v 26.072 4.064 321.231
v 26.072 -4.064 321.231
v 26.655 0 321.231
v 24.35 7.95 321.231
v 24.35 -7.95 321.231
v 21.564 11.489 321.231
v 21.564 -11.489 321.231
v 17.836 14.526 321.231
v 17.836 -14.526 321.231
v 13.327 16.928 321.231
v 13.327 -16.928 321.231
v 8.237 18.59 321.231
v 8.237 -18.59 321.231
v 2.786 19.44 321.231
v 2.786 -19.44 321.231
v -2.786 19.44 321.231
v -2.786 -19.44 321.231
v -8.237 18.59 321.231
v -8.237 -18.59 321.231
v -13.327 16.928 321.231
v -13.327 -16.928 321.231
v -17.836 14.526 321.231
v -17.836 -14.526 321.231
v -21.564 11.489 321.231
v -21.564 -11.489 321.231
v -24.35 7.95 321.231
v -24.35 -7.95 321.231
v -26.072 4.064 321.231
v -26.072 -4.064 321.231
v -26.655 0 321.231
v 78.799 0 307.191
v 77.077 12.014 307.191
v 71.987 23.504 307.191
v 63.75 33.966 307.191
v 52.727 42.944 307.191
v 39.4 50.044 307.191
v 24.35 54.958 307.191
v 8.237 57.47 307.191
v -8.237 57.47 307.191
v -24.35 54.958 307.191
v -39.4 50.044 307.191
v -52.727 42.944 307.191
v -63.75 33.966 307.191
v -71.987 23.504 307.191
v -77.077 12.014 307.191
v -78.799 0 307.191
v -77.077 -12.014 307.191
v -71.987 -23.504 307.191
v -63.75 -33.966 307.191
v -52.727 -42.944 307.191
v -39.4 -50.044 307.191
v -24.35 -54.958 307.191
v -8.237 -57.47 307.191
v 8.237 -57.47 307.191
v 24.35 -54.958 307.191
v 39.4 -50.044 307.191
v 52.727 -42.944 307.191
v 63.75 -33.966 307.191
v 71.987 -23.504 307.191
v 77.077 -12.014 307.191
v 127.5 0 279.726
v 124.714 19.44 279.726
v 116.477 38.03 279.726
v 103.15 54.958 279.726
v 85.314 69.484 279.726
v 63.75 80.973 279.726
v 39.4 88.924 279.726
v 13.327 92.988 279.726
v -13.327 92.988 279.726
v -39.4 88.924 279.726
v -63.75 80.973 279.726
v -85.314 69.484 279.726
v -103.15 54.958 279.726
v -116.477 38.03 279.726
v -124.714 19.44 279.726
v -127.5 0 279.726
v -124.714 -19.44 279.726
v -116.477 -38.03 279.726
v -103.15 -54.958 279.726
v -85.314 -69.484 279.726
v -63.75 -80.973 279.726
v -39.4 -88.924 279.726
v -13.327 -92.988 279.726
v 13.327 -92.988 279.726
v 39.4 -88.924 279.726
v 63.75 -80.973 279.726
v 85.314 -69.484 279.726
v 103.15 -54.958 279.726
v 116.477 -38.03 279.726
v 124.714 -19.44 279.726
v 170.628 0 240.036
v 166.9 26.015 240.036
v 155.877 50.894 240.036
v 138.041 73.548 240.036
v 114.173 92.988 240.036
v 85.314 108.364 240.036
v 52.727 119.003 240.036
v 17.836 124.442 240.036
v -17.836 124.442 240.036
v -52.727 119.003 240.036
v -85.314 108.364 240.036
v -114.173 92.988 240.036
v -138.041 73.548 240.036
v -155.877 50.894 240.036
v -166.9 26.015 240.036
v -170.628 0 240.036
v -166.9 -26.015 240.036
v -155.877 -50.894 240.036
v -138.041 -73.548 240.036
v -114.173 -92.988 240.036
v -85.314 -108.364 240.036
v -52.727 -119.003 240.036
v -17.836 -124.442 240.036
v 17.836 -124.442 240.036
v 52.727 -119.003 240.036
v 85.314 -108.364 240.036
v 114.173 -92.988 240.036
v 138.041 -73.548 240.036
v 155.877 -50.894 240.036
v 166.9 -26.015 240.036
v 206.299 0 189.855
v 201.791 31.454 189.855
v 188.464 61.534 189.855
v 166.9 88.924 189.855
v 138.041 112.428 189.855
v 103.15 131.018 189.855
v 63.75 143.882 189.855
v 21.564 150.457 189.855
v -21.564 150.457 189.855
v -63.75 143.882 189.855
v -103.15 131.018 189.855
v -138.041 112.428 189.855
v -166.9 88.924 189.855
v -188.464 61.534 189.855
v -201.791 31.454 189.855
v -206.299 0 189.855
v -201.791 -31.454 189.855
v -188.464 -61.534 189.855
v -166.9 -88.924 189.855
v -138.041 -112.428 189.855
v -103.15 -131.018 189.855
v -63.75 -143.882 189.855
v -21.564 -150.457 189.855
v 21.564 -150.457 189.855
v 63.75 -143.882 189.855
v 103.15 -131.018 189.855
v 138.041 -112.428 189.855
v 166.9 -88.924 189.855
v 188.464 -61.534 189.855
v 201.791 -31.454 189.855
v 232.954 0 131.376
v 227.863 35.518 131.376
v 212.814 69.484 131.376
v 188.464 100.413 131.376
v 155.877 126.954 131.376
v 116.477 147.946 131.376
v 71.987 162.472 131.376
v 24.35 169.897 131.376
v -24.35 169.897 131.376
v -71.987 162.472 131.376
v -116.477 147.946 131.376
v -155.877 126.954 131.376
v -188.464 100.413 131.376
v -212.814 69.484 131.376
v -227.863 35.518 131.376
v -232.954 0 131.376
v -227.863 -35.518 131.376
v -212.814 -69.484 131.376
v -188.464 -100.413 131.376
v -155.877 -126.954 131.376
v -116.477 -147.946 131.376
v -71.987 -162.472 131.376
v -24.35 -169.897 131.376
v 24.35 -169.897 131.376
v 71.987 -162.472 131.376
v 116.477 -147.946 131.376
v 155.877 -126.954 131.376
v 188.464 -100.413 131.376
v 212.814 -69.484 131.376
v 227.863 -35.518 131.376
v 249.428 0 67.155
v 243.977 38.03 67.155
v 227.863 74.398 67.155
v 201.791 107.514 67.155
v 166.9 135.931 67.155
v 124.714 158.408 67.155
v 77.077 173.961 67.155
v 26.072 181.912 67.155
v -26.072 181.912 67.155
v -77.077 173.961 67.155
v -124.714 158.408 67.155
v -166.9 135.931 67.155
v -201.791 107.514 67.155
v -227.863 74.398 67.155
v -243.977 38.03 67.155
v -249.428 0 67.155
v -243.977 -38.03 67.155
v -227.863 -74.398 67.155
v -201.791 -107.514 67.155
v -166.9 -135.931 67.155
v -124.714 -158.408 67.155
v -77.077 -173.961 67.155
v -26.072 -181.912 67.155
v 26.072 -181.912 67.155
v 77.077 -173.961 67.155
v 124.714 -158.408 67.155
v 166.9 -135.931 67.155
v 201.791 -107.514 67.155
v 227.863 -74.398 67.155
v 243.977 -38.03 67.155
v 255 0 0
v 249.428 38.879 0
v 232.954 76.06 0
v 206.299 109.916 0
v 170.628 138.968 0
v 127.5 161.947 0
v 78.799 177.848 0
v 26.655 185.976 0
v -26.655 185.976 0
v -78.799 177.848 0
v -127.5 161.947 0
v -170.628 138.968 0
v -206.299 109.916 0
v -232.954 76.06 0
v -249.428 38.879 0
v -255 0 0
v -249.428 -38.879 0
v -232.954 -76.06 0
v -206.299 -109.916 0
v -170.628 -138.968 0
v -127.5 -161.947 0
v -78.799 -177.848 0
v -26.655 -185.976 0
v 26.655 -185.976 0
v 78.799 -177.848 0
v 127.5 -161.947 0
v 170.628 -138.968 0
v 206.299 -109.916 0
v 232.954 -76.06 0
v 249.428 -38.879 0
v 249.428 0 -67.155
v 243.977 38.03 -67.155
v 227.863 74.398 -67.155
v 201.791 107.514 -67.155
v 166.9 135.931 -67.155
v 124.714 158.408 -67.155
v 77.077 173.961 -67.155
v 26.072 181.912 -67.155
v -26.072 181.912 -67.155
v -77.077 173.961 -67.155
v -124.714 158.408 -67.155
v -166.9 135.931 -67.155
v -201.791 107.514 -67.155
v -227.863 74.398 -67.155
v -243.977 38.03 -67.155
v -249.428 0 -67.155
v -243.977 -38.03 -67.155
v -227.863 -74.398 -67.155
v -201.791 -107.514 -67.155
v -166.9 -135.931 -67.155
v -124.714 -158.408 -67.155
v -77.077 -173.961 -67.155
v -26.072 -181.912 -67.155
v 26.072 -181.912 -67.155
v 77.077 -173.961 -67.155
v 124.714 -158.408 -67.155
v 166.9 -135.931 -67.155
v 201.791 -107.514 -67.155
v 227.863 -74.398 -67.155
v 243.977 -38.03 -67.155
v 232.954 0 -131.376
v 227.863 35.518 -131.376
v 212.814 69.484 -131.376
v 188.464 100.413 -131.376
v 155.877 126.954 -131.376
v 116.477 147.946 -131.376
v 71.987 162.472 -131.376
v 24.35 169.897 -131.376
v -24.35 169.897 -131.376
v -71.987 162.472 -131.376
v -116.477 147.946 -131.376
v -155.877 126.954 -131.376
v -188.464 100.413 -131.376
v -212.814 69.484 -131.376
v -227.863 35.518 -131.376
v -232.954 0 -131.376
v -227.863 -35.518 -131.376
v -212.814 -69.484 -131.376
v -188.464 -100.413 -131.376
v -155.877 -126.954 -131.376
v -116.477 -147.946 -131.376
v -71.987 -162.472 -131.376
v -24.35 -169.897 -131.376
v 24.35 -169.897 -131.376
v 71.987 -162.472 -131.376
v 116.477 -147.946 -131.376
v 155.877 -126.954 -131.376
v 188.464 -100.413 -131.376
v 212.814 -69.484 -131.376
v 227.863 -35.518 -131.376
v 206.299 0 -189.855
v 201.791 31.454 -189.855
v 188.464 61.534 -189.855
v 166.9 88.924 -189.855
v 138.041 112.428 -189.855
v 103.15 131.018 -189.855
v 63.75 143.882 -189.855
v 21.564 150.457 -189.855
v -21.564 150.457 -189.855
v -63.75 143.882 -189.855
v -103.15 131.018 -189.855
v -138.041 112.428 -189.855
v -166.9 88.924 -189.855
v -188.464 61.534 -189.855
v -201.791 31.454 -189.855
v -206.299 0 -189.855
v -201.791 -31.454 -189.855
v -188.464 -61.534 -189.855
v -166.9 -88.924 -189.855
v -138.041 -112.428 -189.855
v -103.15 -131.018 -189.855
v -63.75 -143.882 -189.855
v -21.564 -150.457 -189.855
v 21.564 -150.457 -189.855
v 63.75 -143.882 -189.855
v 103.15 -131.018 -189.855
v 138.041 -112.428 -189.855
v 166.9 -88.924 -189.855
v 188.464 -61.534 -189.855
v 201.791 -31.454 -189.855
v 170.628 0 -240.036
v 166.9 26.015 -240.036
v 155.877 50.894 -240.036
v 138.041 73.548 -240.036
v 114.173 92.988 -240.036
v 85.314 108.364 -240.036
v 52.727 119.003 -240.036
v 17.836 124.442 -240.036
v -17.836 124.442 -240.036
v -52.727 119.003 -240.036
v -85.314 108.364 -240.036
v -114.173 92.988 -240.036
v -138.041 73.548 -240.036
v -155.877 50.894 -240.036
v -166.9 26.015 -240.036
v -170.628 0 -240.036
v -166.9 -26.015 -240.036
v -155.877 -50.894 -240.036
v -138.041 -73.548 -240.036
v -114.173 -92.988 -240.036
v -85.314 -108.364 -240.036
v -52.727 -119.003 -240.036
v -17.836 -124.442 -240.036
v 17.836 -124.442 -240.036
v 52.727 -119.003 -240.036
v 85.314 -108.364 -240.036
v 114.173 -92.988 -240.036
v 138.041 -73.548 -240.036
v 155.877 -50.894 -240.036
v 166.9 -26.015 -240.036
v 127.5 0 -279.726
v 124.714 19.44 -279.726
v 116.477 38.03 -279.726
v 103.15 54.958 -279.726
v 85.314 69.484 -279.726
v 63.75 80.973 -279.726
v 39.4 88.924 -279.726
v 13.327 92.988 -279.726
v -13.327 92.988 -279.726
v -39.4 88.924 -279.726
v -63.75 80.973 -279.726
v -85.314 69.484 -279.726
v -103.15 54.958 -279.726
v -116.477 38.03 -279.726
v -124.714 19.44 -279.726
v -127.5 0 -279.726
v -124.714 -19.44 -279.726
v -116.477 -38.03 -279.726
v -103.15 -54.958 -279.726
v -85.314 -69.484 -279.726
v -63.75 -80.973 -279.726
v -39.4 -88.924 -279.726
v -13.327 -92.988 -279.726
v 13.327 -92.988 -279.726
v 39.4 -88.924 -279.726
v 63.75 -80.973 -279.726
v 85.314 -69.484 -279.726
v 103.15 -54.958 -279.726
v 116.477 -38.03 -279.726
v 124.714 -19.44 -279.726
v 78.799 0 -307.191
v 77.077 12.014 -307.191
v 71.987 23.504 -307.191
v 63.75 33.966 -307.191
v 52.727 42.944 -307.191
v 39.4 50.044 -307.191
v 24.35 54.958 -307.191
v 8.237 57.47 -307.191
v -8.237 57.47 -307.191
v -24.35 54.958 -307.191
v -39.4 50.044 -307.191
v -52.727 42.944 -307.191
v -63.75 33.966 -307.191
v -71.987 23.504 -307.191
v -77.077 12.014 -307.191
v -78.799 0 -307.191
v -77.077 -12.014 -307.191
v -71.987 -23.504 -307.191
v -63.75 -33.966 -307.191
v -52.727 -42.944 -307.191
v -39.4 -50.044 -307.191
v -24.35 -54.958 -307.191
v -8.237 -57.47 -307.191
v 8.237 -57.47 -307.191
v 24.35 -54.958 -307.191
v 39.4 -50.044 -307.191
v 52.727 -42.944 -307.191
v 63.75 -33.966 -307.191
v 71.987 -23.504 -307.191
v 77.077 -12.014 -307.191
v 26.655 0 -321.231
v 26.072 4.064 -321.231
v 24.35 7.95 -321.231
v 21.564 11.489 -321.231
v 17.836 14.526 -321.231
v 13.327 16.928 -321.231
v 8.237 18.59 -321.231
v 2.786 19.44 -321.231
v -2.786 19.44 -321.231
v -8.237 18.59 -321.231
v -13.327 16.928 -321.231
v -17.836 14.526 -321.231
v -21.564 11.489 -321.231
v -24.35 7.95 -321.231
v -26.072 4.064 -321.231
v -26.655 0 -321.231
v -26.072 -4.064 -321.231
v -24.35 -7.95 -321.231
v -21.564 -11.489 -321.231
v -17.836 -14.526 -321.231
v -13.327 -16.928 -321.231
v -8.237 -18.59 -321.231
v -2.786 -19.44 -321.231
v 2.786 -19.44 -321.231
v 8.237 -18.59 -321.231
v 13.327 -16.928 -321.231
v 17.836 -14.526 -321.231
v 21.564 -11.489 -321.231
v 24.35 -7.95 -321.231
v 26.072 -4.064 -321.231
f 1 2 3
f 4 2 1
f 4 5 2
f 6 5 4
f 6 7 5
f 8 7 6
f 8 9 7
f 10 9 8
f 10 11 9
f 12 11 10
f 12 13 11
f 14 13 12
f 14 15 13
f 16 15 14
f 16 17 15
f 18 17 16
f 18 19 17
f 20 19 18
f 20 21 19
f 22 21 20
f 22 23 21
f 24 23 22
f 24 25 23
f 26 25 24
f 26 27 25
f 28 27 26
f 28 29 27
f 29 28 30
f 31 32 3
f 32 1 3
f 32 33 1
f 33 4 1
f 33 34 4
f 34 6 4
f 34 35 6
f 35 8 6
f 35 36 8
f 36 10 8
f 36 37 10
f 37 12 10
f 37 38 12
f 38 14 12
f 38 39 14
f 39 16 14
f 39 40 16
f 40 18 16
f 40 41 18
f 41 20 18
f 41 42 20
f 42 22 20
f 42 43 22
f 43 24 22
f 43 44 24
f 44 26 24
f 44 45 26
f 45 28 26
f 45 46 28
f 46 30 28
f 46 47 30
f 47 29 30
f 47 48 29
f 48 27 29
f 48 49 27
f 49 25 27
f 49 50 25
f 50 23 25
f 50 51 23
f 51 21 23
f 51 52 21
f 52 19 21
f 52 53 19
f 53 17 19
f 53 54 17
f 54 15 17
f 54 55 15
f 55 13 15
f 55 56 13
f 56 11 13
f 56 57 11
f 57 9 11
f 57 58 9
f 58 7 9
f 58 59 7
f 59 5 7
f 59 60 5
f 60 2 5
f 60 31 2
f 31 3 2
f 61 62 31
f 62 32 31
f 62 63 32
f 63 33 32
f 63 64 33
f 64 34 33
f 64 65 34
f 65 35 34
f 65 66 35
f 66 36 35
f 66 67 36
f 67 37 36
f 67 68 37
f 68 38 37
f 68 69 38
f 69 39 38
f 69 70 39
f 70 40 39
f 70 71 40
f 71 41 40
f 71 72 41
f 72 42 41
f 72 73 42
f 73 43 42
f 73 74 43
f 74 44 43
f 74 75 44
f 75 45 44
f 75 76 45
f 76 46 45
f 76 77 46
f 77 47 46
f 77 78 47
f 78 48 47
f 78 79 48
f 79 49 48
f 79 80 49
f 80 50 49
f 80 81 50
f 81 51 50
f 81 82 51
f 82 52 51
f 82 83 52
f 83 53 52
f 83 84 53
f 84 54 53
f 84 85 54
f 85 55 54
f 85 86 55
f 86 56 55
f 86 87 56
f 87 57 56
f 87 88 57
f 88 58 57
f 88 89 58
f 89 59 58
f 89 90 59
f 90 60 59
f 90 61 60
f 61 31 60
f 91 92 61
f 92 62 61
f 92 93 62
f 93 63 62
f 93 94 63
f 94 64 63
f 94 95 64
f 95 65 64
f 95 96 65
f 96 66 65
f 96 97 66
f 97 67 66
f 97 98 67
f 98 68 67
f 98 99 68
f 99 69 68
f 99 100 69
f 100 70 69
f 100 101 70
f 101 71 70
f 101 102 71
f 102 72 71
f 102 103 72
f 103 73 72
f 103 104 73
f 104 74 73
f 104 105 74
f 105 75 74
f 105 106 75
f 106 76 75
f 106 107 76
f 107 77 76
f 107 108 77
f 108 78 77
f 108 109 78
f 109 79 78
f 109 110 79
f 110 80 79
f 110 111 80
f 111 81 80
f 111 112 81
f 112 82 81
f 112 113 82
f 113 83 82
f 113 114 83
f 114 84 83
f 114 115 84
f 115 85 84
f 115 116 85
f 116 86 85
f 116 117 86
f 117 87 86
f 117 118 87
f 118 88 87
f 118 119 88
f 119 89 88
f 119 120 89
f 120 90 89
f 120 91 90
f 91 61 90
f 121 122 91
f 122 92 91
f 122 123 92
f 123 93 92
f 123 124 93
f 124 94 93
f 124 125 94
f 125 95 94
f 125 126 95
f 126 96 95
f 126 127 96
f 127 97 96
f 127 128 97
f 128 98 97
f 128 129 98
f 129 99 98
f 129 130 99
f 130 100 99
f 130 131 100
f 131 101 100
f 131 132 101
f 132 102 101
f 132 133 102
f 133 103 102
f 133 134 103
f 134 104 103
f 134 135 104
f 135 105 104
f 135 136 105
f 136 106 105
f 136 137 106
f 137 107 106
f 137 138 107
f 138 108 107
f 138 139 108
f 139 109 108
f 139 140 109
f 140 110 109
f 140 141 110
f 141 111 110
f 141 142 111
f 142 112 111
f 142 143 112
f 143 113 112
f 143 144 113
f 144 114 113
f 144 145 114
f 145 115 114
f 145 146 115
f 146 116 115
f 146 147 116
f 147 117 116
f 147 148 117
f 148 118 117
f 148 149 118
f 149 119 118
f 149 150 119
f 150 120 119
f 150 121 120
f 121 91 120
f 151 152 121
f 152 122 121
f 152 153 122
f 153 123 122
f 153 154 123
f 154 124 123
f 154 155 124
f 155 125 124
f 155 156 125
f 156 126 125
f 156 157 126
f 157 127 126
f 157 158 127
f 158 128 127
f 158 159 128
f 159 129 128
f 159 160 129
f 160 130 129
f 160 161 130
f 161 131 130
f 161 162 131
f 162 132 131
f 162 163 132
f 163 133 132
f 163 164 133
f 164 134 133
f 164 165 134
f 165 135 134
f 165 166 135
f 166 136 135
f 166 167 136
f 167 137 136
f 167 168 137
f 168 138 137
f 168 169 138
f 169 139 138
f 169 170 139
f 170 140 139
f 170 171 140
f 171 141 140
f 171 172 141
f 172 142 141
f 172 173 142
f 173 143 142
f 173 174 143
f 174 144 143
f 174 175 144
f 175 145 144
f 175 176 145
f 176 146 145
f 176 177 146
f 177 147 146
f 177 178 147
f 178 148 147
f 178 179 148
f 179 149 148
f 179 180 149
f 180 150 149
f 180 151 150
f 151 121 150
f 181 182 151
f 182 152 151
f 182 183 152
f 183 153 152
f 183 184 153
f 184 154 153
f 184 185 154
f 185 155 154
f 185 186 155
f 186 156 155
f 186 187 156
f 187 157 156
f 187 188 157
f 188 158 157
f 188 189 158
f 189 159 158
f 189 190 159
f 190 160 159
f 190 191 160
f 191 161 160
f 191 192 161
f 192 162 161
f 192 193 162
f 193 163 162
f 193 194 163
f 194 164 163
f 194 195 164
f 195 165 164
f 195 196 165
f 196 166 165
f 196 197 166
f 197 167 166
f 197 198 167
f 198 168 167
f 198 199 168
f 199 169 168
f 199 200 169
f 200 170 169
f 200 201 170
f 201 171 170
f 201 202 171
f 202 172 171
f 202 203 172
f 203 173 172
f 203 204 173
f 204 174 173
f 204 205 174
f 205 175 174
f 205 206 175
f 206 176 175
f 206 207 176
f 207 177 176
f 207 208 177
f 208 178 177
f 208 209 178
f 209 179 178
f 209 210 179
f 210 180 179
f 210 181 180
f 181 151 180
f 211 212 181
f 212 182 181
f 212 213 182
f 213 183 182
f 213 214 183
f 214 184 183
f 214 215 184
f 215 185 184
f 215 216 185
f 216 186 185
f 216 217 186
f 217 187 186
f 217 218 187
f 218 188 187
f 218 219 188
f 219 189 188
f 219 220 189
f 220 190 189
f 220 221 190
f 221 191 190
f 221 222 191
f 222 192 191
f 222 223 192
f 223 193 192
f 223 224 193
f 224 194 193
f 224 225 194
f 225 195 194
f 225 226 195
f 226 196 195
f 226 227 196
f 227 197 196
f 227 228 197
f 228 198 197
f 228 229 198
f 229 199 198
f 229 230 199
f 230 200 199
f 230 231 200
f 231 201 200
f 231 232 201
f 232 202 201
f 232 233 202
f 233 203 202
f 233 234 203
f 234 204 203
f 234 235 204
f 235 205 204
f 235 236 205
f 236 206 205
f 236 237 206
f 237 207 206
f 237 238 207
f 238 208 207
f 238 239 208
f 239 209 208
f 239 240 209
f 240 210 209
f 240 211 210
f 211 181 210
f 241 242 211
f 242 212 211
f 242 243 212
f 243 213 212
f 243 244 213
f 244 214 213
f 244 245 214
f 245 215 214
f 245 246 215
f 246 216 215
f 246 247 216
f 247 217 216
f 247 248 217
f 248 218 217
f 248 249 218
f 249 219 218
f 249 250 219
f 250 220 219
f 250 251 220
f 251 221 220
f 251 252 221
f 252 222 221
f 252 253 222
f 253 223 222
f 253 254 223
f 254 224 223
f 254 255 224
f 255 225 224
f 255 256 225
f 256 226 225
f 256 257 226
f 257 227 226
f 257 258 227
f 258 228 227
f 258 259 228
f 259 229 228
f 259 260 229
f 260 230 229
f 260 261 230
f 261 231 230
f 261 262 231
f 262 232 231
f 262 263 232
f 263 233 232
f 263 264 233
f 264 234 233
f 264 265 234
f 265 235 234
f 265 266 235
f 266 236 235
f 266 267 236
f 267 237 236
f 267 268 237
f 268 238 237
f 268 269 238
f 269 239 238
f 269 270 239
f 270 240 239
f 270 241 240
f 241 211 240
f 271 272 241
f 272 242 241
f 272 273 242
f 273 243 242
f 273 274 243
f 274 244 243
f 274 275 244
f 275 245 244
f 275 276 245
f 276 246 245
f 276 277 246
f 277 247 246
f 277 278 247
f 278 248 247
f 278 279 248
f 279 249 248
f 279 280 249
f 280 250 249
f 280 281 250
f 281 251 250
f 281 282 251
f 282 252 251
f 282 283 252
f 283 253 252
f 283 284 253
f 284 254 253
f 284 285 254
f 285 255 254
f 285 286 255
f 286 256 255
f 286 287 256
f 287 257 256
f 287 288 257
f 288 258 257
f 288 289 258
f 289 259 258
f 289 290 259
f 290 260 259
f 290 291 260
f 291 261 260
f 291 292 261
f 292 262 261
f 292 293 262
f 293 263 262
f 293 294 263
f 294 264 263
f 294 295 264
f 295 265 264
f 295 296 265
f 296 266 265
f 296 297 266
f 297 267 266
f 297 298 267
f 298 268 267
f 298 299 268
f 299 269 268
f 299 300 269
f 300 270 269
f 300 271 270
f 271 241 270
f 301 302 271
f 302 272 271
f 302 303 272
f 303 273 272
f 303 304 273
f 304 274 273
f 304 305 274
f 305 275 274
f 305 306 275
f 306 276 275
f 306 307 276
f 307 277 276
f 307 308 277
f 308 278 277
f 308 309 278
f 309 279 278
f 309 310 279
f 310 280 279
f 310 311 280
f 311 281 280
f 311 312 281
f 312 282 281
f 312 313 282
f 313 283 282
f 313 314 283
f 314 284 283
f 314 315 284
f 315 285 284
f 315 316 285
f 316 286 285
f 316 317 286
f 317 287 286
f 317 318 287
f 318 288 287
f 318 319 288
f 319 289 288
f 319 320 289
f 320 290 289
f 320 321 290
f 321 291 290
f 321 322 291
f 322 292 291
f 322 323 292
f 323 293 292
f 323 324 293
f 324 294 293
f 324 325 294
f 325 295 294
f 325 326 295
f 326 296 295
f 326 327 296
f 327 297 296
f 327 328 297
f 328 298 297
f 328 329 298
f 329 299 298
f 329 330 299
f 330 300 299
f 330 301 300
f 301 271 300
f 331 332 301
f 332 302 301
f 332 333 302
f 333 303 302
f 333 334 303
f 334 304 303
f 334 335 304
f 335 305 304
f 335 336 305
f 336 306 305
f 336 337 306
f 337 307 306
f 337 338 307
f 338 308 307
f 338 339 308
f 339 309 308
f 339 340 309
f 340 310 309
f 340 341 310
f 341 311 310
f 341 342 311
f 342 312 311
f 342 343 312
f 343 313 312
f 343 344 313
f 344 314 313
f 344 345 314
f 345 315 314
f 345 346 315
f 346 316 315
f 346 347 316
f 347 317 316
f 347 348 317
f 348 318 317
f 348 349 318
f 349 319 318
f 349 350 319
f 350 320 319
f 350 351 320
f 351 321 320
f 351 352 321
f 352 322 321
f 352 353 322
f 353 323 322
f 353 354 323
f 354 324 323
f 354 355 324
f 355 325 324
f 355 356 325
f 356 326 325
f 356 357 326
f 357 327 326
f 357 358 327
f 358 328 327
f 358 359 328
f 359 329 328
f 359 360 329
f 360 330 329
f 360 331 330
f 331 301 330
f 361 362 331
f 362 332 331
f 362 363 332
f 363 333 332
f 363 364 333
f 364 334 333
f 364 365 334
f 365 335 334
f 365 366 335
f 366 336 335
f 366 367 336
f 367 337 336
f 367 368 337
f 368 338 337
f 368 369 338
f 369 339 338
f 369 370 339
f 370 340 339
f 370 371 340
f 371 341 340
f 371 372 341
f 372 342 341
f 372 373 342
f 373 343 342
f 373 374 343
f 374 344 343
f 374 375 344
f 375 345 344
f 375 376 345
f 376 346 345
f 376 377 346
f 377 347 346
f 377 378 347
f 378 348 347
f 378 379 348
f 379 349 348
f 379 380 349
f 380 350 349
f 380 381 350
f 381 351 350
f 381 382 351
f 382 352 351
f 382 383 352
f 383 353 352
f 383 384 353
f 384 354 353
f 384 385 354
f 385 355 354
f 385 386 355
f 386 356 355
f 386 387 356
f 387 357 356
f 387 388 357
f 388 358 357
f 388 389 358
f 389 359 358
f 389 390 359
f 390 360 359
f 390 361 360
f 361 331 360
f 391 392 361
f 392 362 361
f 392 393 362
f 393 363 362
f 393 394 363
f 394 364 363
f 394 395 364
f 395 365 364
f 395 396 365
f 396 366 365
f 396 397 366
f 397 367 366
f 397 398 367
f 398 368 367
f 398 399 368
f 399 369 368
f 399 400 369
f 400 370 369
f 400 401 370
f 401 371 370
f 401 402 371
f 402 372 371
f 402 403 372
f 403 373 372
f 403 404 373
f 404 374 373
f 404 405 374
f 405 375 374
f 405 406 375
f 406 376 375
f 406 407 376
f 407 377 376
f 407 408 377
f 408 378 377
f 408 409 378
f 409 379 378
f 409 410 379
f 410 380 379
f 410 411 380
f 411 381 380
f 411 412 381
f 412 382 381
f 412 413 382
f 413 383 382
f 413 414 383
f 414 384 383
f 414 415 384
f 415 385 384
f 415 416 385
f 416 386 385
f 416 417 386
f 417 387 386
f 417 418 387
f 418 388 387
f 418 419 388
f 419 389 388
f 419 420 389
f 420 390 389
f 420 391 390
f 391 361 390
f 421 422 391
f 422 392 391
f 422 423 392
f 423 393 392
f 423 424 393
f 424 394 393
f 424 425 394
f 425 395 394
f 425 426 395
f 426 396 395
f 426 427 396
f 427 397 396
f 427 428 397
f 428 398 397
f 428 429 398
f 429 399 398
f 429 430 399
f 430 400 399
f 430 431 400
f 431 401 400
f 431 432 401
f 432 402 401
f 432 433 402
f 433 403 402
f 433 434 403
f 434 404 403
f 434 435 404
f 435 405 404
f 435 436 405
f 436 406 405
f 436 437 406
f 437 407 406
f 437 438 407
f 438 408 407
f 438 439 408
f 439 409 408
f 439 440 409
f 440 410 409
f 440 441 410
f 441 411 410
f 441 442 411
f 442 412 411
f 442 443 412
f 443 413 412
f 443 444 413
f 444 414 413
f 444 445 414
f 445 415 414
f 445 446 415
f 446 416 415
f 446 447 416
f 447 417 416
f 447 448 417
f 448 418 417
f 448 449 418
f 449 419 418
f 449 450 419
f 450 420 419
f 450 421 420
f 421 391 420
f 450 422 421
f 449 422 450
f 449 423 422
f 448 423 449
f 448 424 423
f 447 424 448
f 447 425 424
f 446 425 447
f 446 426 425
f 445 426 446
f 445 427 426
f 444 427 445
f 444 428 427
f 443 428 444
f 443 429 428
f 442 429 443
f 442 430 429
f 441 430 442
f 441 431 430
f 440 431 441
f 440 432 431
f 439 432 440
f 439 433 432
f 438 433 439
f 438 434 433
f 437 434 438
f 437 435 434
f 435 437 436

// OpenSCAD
// Generated by SolidPython 1.0.1 on 2020-07-29 00:46:52


scale(v = [15, 11, 19]) {
	sphere(r = 17);
}
/***********************************************
*********      SolidPython code:      **********
************************************************
 
# import packages: SolidPython
from solid import *
from solid.utils import *
from itertools import chain, combinations, permutations


class Resize:

    def __init__(self, scad_file):
        self.scad_file = scad_file
        #self.scad_file = import_scad(scad_file)
        # cone/cylinder param:
        self.r1 = 0
        self.r2 = 0
        self.h = 0
        # rectangular prism param:
        self.w = 0
        self.l = 0
        # ellipse param:
        self.r = 0

    # import OpenScad code (file name corresponds to shape)


    # classify shape + parameters
    def assign(self, param1, param2, param3):
        if self.scad_file == 'cone.scad':
            self.r1 = param1
            self.r2 = param2
            self.h = param3
        elif self.scad_file == 'cylinder.scad':
            self.r1 = param1
            self.r2 = param2
            self.h = param3
        elif self.scad_file == 'rectangularPrism.scad':
            self.h = param1
            self.l = param2
            self.w = param3
        else:
            self.r = param1
            self.h = param2

    # resize parameters
    def iterate(self):
        x = range(3, 20, 2)
        i = 1
        if self.scad_file == 'cone.scad':
            tempList = list(permutations(x, 2))
            for temp in tempList:
                param1 = temp[0]
                param2 = temp[1]
                filepath = 'produced_scad_files/' + 'cone' + str(param1) + '_' + str(param2) + '_' + '.scad'
                scad_render_to_file(cylinder(h=param1, r1=param2, r2=0), filepath)

        elif self.scad_file == 'cylinder.scad':
            tempList = list(permutations(x, 3))
            for temp in tempList:
                param1 = temp[0]
                param2 = temp[1]
                filepath = 'produced_scad_files/' + 'cylinder' + str(param1) + '_' + str(param2) + '_' + '.scad'
                scad_render_to_file(cylinder(h=param1, r1=param2, r2=param2), filepath)

        elif self.scad_file == 'rectangularPrism.scad':
            tempList = list(permutations(x, 3))
            for temp in tempList:
                param1 = temp[0]
                param2 = temp[1]
                param3 = temp[2]
                filepath = 'produced_scad_files/' + 'rectangularPrism' + str(param1) + '_' + str(param2) + '_' + str(
                    param3) + '.scad'
                scad_render_to_file(cube(size=(param1, param2, param3)), filepath)

        elif self.scad_file == 'ellipse.scad':
            tempList = list(permutations(x, 4))
            for temp in tempList:
                param1 = temp[0]
                param2 = temp[1]
                param3 = temp[2]
                param4 = temp[3]
                filepath = 'produced_scad_files/' + 'ellipse' + str(param1) + '_' + str(param2) + '_' + str(param3) + '_' + str(param4) + '.scad'
                scad_render_to_file(scale([param1, param2, param3])(sphere(r=param4)), filepath)

    def render_to_scadfile(self):
        scad_render_to_file(scad, 'example.scad') 
 
************************************************/
